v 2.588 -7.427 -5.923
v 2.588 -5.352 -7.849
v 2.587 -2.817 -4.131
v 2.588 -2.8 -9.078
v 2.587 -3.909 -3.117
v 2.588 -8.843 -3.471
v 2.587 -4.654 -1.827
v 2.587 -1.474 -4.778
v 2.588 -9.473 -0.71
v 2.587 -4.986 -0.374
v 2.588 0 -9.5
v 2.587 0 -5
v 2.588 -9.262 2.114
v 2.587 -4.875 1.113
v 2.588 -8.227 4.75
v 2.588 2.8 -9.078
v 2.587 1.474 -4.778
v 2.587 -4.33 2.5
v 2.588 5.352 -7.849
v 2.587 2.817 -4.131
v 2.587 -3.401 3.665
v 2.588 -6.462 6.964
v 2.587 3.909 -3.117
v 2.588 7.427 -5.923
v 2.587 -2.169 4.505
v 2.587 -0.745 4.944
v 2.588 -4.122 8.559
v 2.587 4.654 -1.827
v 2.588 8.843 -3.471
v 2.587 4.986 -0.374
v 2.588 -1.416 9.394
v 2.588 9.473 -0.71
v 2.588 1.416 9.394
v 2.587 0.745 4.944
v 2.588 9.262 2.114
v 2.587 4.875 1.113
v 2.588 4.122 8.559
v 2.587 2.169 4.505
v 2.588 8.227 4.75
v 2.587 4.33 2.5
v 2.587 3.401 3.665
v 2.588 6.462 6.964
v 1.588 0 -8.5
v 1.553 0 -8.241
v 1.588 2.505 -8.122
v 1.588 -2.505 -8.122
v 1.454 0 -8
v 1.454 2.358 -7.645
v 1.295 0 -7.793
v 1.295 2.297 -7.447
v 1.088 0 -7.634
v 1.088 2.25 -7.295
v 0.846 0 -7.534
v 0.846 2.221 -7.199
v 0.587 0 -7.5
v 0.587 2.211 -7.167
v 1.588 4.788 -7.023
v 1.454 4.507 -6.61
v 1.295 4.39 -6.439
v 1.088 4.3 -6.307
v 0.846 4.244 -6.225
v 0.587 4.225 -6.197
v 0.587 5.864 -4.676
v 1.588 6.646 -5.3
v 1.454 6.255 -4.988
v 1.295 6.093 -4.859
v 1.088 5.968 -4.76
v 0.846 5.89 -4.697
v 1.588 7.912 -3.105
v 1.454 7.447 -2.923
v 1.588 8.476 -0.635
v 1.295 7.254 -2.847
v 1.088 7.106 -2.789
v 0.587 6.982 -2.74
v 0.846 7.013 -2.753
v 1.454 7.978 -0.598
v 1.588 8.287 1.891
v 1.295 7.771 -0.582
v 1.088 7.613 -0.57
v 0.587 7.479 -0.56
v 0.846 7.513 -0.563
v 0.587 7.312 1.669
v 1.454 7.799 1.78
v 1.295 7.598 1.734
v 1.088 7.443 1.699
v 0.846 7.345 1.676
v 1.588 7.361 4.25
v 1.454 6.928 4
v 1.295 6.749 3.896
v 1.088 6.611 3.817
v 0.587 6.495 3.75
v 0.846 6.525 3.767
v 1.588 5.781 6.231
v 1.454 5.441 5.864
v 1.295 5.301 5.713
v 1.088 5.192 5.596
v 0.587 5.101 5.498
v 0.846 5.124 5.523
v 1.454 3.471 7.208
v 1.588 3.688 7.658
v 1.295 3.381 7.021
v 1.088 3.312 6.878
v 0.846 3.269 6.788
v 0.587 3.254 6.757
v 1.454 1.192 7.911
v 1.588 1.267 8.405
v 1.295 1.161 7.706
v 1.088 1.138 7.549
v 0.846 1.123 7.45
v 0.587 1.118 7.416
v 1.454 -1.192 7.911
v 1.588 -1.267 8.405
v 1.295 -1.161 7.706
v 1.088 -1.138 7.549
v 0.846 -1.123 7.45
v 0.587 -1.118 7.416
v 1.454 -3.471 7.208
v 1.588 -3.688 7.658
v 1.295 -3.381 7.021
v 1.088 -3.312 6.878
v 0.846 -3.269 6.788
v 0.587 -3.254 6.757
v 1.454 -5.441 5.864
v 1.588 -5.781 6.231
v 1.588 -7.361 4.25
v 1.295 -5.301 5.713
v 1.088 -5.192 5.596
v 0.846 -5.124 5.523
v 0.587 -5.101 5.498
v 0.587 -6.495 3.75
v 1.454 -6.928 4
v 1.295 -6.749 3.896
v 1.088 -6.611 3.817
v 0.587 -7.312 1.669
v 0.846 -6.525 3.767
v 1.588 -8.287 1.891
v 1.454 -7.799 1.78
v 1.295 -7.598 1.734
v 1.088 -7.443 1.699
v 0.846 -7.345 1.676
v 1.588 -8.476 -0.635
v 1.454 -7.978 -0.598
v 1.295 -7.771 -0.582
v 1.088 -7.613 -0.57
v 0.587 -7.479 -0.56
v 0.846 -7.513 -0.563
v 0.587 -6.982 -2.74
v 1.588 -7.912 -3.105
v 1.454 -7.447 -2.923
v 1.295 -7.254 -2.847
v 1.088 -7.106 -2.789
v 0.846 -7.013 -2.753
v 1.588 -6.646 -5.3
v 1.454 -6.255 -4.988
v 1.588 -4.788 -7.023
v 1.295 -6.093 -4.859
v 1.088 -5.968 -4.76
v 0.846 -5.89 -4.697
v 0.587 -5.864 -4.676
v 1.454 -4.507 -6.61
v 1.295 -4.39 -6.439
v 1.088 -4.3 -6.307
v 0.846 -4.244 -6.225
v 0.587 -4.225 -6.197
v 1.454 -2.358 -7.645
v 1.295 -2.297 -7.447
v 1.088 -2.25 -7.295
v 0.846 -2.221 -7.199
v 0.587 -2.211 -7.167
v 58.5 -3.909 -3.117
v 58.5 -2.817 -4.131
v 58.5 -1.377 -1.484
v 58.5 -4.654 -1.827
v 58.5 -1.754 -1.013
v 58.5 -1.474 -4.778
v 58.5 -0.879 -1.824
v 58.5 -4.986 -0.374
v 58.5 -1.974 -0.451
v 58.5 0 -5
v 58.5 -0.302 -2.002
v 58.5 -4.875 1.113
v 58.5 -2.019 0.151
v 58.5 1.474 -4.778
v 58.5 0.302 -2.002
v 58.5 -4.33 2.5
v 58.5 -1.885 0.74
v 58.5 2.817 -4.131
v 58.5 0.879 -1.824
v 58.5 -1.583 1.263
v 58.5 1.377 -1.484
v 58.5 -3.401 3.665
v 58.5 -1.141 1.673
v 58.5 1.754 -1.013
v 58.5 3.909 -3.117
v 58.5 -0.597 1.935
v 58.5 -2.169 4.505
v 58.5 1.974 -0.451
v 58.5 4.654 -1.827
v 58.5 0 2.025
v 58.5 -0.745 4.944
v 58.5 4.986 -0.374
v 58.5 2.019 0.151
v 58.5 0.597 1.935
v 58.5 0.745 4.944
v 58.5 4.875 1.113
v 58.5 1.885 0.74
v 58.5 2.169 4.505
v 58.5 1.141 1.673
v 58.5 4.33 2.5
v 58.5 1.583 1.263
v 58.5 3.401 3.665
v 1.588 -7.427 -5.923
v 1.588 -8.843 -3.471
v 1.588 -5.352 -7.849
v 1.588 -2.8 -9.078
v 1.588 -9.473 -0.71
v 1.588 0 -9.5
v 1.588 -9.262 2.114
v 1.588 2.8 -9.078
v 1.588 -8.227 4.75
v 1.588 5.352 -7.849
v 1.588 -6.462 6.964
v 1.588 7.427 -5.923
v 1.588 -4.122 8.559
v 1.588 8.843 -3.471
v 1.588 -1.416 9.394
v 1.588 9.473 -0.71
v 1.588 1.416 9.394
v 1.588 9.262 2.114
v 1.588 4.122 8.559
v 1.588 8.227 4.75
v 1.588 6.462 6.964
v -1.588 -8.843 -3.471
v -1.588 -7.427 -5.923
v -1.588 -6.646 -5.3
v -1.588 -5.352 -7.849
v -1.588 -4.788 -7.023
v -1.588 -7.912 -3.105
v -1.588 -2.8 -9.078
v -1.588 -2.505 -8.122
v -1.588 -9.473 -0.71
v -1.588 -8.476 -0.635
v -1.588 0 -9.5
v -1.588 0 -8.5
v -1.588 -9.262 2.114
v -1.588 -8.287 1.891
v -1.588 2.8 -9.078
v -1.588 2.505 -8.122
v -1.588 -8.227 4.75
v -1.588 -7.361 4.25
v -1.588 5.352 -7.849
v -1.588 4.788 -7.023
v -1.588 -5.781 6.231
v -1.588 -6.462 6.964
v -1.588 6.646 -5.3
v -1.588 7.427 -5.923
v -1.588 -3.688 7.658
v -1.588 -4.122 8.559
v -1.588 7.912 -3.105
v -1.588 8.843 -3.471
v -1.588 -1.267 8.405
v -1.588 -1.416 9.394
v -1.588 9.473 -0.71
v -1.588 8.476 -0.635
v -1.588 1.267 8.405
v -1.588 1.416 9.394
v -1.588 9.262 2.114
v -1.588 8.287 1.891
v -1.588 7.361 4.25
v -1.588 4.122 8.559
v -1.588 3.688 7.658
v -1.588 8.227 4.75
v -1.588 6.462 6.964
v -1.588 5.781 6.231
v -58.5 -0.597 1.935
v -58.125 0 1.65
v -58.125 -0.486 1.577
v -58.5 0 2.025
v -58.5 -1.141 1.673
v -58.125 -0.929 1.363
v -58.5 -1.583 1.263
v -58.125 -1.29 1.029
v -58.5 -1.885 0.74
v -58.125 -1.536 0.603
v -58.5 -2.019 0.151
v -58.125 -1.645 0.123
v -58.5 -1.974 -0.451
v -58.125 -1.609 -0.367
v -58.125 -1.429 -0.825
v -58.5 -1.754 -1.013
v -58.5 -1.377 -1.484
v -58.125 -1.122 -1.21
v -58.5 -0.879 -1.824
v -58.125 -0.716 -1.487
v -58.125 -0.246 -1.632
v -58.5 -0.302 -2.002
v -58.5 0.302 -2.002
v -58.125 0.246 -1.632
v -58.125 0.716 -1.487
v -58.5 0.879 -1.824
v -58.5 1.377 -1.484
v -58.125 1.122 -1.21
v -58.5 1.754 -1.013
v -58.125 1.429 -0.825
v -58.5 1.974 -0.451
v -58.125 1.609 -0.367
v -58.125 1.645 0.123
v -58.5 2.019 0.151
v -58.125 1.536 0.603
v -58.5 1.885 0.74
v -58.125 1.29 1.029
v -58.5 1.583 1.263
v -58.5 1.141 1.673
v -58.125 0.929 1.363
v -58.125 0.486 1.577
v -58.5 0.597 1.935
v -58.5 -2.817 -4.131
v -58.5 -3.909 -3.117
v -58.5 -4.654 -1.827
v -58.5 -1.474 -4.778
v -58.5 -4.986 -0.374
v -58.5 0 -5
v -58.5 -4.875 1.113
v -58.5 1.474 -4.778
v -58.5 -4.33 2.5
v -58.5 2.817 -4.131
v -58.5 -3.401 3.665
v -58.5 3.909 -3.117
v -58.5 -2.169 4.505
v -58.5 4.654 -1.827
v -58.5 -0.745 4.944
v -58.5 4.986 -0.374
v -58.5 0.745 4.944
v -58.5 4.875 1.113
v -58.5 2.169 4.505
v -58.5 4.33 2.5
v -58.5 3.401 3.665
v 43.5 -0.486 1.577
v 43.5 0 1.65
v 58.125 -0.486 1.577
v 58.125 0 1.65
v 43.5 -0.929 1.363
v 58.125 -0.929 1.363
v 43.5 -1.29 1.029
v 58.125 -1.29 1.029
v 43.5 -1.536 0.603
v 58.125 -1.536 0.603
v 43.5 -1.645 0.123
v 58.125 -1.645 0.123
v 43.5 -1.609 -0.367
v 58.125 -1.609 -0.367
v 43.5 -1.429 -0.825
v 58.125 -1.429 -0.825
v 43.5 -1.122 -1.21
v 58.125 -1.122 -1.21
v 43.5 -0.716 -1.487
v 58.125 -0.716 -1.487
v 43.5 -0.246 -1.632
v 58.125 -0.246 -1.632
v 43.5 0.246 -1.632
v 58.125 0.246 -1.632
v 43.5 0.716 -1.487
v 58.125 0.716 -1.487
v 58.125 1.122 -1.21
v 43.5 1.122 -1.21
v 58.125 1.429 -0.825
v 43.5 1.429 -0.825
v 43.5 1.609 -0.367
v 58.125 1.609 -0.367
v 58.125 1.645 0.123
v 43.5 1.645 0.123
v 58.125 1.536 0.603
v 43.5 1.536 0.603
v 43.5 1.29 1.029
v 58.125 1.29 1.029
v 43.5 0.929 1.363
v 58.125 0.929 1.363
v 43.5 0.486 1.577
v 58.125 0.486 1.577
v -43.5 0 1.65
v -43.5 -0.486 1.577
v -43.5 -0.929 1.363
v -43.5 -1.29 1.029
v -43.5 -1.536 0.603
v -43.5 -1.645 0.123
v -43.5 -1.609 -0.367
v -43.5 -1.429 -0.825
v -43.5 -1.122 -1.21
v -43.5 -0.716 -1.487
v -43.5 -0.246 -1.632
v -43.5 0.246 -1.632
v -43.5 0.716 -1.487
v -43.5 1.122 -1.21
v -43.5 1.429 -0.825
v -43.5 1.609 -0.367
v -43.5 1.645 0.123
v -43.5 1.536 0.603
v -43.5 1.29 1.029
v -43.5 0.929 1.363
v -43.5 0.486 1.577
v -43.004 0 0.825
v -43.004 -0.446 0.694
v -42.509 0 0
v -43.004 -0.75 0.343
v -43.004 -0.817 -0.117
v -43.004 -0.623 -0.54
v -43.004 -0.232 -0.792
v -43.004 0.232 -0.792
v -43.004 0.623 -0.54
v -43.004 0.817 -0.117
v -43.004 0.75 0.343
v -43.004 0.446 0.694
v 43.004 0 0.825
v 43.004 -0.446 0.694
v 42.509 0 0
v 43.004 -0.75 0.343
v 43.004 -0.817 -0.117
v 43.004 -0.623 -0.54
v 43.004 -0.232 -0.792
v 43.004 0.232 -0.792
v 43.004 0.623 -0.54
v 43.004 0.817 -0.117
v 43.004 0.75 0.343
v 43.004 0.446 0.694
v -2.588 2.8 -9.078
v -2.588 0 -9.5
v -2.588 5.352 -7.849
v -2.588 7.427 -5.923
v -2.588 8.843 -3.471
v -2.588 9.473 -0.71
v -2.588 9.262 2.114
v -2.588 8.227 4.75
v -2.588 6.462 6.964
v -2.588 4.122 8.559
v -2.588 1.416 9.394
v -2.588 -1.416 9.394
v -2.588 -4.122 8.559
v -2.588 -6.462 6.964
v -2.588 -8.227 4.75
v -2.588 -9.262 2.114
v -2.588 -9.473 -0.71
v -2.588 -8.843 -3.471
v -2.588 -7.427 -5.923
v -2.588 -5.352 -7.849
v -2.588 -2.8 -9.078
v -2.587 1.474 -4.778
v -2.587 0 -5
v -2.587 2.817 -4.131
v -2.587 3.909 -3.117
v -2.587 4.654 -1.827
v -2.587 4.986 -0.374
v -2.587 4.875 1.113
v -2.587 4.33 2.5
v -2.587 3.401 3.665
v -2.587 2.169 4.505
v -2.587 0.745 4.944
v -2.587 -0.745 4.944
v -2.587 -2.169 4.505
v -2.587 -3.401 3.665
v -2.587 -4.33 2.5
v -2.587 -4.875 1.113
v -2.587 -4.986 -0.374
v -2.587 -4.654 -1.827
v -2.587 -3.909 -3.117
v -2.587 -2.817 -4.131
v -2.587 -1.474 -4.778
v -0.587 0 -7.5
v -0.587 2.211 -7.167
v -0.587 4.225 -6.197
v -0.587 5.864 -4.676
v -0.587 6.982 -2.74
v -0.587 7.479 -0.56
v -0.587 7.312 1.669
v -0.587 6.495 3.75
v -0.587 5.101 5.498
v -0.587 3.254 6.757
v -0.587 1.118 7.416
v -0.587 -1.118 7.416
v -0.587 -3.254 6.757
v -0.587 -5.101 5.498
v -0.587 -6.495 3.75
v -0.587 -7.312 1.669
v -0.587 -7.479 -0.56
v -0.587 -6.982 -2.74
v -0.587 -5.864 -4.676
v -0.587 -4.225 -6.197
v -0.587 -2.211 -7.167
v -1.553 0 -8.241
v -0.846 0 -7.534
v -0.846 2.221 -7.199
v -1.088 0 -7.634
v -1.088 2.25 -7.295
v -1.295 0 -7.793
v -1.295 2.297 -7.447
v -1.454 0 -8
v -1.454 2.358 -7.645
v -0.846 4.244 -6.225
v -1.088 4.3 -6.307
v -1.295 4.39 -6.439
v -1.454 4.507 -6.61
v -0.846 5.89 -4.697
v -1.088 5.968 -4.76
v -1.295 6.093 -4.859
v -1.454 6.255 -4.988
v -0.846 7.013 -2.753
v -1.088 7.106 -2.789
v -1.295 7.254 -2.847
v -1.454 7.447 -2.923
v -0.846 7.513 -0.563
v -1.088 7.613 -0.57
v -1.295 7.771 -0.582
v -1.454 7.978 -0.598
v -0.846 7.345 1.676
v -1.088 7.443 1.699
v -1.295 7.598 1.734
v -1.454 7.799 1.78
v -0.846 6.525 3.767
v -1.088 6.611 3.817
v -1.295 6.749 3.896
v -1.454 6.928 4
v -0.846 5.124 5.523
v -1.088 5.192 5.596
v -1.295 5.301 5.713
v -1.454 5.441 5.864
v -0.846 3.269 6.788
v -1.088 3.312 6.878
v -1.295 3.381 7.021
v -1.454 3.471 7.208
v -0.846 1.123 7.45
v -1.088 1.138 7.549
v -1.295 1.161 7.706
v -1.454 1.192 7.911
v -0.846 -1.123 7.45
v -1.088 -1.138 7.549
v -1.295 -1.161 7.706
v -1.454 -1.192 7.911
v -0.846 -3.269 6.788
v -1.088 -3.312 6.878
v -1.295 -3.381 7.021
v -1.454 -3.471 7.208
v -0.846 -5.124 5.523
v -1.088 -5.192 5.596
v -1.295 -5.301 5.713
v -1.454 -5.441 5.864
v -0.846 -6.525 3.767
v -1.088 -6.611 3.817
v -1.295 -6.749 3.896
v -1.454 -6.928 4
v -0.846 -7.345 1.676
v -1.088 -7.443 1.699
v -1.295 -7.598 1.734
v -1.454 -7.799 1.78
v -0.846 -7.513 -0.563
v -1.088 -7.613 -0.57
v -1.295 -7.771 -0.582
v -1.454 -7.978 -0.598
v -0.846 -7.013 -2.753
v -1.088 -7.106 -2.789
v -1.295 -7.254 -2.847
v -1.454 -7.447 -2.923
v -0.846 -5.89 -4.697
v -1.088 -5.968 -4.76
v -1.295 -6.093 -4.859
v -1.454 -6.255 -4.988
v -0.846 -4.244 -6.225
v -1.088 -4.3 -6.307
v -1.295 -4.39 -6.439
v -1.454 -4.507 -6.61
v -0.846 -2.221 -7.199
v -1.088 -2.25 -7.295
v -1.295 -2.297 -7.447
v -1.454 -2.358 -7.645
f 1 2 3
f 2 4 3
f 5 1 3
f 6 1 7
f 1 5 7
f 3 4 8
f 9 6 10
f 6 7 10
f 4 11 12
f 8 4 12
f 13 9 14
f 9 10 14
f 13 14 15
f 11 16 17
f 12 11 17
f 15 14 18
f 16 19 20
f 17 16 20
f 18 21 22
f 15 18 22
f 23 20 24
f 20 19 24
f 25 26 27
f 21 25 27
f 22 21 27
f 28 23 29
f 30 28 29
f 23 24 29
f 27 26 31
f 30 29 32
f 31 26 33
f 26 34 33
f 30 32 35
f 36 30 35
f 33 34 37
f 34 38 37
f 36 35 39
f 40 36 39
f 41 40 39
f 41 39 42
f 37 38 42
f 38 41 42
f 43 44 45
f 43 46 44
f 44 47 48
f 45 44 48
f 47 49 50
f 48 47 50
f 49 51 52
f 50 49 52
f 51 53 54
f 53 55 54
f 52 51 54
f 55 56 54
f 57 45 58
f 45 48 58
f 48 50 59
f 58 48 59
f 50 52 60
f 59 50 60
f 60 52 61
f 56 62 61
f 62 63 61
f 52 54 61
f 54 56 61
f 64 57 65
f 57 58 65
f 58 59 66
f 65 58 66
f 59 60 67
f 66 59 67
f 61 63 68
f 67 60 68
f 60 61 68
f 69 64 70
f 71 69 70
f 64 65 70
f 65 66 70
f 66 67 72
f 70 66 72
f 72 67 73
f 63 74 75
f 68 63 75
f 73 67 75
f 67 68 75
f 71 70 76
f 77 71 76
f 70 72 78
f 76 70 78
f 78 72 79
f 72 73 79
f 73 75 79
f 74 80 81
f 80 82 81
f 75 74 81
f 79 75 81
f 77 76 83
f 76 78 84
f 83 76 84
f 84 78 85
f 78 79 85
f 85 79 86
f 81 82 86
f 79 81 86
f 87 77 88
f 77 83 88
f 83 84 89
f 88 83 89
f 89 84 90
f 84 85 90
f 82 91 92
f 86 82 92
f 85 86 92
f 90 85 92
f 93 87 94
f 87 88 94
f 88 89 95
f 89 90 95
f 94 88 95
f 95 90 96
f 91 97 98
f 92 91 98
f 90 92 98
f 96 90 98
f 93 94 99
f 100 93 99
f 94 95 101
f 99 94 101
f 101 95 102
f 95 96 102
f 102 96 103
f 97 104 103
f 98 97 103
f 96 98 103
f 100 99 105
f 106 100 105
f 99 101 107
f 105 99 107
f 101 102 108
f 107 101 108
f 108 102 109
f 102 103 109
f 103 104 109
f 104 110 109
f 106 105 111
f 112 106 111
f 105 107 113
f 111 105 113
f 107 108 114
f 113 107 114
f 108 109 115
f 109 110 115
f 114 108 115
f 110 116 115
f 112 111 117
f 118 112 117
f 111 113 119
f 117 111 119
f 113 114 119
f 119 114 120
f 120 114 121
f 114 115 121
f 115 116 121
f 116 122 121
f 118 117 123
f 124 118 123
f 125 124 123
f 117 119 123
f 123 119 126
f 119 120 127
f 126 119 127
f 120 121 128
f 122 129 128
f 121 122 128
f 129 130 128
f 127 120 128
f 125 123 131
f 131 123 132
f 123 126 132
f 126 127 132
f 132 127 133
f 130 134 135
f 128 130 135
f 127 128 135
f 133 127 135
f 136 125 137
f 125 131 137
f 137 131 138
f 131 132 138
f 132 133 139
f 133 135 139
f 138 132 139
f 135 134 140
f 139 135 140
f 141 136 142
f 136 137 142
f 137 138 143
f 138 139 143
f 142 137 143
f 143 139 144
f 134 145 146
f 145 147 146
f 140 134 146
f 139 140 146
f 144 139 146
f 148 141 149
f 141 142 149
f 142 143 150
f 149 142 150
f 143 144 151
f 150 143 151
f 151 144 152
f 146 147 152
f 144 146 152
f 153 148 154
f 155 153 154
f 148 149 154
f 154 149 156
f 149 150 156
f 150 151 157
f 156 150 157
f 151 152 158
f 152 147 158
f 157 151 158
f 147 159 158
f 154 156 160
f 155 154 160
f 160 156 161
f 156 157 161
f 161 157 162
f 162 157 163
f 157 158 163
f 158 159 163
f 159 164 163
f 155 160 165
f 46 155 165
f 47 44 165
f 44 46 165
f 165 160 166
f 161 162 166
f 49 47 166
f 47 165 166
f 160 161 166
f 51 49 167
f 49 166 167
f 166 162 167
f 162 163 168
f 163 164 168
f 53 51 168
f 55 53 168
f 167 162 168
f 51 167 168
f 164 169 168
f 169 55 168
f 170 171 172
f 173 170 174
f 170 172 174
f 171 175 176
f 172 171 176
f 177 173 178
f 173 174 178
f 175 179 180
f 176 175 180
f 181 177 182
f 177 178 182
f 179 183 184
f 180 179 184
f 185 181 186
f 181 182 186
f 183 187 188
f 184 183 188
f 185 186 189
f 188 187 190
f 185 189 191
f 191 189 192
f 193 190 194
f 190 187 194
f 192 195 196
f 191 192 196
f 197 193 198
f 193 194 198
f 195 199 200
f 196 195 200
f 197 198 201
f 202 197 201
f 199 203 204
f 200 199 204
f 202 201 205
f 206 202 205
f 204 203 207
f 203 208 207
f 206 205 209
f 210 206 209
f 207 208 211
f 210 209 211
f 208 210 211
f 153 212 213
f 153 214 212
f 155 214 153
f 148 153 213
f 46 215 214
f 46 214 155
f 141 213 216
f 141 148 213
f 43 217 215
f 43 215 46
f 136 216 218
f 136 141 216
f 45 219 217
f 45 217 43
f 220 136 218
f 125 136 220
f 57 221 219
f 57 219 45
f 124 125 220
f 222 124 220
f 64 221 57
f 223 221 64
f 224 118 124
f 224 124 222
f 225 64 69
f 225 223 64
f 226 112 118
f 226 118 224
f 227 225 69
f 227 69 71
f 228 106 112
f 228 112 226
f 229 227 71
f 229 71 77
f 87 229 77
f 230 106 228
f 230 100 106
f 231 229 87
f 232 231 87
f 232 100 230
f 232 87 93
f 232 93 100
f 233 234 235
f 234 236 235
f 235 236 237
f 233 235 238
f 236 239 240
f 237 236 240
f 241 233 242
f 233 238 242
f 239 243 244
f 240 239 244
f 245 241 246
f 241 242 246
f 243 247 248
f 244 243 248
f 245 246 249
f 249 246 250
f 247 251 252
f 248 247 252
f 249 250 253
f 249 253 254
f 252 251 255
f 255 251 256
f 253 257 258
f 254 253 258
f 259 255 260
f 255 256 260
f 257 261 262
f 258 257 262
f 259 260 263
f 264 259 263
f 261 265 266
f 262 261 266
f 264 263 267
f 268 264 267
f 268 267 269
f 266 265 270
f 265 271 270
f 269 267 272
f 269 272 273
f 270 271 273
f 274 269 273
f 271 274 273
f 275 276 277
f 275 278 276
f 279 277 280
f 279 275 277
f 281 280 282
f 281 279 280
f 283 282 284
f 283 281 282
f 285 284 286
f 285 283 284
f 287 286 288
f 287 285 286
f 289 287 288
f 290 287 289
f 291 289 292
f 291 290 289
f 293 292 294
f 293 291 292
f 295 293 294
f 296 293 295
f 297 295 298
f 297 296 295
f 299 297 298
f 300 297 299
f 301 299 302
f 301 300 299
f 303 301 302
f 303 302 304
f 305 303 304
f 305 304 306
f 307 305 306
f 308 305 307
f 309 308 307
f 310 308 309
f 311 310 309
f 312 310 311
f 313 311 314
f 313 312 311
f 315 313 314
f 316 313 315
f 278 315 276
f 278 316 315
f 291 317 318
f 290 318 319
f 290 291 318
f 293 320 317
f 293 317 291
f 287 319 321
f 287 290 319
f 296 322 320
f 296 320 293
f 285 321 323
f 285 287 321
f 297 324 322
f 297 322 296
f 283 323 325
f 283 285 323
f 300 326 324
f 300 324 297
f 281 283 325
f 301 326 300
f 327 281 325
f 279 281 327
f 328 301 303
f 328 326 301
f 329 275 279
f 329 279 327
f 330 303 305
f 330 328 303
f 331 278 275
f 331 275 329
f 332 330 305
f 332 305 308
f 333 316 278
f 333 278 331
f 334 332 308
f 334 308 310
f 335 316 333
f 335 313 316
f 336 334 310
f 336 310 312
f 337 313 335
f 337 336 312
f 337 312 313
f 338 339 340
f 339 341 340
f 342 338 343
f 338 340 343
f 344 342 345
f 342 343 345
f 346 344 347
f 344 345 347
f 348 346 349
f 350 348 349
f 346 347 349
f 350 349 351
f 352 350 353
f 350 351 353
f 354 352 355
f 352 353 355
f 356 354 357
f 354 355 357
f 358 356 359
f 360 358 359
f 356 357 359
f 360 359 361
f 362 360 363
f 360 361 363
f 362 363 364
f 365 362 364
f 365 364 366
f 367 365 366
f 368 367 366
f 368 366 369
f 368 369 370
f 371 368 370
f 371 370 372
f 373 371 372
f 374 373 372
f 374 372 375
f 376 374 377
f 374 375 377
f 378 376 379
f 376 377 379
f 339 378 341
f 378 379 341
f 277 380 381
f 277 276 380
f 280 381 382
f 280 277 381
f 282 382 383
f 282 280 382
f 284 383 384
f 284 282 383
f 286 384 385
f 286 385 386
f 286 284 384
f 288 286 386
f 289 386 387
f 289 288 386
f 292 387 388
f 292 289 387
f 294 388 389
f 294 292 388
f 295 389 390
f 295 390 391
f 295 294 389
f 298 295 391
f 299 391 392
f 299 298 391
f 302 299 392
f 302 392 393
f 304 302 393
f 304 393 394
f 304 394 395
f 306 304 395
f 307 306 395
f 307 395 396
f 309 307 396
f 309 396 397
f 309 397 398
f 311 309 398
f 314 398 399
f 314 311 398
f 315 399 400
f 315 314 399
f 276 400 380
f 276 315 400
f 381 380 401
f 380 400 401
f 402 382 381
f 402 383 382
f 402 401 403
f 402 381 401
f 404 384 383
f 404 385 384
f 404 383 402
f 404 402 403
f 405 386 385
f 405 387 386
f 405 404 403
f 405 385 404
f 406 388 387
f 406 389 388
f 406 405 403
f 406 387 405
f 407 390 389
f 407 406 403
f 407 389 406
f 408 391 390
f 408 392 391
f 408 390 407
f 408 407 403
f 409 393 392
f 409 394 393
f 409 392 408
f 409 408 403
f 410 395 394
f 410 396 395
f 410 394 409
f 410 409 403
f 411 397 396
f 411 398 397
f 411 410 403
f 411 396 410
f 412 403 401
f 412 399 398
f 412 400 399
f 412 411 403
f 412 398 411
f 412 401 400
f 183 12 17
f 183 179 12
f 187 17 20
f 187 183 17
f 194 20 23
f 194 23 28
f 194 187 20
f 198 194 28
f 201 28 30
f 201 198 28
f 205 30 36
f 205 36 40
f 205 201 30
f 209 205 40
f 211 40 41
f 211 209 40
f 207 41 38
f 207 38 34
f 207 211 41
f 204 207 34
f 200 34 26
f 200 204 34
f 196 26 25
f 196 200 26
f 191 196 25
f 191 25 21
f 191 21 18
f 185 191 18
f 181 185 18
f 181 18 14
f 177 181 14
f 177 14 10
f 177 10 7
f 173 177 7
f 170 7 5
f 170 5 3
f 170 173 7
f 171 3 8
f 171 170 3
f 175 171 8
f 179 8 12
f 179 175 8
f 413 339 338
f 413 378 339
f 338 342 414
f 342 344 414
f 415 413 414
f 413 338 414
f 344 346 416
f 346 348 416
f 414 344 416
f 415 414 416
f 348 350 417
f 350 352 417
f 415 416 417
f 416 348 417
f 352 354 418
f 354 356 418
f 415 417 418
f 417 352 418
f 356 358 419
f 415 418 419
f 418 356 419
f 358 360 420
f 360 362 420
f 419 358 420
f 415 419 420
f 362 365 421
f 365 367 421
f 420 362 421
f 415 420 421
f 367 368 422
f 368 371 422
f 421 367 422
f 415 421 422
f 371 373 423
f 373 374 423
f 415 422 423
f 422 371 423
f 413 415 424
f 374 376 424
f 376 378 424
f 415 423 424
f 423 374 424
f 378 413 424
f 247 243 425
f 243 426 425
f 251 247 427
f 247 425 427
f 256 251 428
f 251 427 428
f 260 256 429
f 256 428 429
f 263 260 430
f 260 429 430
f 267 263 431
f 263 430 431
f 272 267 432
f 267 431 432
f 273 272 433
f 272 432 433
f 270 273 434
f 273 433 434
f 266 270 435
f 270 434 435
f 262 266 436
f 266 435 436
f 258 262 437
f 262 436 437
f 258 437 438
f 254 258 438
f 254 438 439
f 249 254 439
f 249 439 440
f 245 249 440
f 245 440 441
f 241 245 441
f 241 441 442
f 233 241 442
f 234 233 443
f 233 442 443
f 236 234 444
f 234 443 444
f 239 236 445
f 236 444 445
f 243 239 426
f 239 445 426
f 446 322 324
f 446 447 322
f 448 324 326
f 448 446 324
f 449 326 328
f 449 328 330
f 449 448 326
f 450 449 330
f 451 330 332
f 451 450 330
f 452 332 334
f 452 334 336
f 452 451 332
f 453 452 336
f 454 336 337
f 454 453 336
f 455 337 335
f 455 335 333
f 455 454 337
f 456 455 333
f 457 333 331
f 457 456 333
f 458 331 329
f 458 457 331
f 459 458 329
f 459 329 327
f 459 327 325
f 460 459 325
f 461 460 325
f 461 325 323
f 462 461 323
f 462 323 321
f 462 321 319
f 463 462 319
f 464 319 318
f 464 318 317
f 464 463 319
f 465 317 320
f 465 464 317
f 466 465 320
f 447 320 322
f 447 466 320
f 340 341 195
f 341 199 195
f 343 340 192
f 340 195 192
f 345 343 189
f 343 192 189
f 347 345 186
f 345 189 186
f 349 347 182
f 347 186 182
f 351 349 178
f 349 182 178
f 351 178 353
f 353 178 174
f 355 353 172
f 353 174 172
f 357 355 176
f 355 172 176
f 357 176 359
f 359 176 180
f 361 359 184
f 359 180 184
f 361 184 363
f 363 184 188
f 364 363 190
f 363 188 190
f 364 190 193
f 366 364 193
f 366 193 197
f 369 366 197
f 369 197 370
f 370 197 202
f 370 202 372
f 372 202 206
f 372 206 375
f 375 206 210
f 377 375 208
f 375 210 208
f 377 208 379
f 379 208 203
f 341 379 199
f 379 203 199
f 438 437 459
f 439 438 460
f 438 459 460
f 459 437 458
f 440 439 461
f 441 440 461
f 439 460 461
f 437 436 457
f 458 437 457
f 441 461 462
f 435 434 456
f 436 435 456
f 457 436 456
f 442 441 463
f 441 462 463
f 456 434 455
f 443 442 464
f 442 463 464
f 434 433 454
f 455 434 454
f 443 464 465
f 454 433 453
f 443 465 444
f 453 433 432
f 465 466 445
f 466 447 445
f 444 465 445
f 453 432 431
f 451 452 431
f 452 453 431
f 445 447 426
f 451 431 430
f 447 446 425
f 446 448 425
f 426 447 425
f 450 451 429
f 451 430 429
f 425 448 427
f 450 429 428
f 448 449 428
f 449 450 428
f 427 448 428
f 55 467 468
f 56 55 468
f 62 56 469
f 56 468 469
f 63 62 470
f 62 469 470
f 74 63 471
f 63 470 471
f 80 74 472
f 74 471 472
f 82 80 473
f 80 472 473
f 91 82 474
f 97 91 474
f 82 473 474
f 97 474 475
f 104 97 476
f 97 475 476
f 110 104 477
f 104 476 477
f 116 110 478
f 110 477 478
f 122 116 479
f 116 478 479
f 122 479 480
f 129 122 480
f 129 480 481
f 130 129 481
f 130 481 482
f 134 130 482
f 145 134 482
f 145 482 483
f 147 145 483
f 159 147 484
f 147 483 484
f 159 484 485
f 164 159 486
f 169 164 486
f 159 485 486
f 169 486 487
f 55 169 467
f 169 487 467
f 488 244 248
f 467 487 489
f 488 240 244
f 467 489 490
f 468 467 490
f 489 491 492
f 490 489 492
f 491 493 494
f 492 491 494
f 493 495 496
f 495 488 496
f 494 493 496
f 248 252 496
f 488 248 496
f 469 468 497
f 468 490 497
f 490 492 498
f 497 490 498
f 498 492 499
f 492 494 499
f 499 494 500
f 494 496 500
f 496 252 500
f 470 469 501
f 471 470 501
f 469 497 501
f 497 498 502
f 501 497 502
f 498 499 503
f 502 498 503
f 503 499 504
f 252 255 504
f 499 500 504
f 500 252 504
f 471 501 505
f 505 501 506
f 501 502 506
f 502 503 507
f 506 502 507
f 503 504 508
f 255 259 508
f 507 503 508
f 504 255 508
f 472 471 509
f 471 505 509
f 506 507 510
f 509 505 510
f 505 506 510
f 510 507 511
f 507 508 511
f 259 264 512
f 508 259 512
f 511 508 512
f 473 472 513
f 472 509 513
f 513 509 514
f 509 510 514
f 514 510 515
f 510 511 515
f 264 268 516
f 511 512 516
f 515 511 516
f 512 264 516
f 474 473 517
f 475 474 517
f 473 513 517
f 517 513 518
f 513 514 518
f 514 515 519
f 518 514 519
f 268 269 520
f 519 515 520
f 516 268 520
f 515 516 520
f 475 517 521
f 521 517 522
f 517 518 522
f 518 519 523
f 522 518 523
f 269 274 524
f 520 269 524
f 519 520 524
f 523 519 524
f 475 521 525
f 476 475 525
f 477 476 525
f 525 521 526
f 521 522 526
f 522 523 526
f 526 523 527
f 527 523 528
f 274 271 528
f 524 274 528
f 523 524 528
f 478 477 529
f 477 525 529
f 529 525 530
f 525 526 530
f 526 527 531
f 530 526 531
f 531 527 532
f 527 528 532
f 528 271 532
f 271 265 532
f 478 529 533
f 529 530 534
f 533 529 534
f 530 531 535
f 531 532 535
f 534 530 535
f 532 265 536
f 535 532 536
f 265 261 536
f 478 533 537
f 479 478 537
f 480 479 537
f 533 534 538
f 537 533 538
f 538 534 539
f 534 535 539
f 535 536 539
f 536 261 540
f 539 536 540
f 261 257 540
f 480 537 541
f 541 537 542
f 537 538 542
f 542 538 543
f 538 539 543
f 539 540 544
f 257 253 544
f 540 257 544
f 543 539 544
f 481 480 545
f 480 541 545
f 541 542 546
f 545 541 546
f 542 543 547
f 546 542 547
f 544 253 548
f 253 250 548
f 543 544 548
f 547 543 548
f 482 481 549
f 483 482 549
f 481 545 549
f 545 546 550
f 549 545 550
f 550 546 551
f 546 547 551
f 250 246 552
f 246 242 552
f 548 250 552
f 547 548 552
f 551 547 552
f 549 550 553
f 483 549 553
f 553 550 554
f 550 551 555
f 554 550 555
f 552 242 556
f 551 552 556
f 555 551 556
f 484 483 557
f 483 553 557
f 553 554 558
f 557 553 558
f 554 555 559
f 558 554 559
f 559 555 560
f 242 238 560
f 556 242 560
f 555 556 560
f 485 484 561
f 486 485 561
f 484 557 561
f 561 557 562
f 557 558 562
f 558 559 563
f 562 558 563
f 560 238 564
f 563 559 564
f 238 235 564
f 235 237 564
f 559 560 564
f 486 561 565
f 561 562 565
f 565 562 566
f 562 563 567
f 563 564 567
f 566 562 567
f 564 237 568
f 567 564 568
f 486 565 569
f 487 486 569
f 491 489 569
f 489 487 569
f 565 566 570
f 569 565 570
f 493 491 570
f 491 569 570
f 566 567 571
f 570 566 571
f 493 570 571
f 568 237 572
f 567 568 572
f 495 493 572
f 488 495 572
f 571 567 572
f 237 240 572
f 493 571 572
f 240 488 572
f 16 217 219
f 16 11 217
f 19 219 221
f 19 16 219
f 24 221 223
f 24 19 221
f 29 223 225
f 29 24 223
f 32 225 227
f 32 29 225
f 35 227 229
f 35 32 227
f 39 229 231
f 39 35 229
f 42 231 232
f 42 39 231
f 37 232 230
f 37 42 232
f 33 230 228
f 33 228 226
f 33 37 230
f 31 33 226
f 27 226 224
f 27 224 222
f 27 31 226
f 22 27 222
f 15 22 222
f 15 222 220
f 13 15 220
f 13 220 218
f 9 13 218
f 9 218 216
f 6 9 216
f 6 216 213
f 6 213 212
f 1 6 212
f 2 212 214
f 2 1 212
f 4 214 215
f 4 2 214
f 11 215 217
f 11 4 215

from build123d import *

# Parameters (mm, degrees)
SKETCH1_W   = 1.5875
SKETCH1_H   = 7.5
SKETCH1_W_2 = 1
SKETCH1_H_2 = 9.5
SKETCH1_W_3 = 55.9125
SKETCH1_H_3 = 5
FILLET1_R   = 1


with BuildPart() as part:
    # Sketch1 → Revolve1 (revolve)
    with BuildSketch(Plane(origin=(0, 0, 0), x_dir=(1, 0, 0), z_dir=(0, 1, 0))):
        Polygon((-2.5875, 0), (-1.5875, 0), (-1.5875, 7.5), (-1.5875, 9.5), (-2.5875, 9.5), (-2.5875, 5), align=None)
        with Locations((-0.79375, 3.75)):
            Rectangle(SKETCH1_W, SKETCH1_H)
        with Locations((0.79375, 3.75)):
            Rectangle(SKETCH1_W, SKETCH1_H)
        with Locations((2.0875, 4.75)):
            Rectangle(SKETCH1_W_2, SKETCH1_H_2)
        with Locations((-30.54375, 2.5)):
            Rectangle(SKETCH1_W_3, SKETCH1_H_3)
        with Locations((30.54375, 2.5)):
            Rectangle(SKETCH1_W_3, SKETCH1_H_3)
    revolve(axis=Axis((-2.646790194, 0, 0), (1, 0, 0)))

    # Fillet1
    fillet1_edges = [part.edges().sort_by_distance(p)[0] for p in [
        (-1.5875, 0, 7.5),
        (1.5875, 0, 7.5),
    ]]
    fillet(fillet1_edges, radius=FILLET1_R)

    # Sketch3 → M4x0.7 Tapped Hole1 (revolve, cut)
    with BuildSketch(Plane(origin=(-58.5, 0, 0), x_dir=(0, 0, 1), z_dir=(0, 1, 0))):
        Polygon((0, 0), (0, 15.991420021), (1.65, 15), (1.65, 0.375), (2.025, 0), align=None)
    m4x0_7_tapped_hole1 = revolve(axis=Axis((-64.85, 0, 0), (1, 0, 0)), mode=Mode.SUBTRACT)

    # Mirror1: M4x0.7 Tapped Hole1 across plane
    add(m4x0_7_tapped_hole1.mirror(Plane(origin=(0, 0, 0), x_dir=(0, 0, 1), z_dir=(1, 0, 0))), mode=Mode.SUBTRACT)


solid = part.part
